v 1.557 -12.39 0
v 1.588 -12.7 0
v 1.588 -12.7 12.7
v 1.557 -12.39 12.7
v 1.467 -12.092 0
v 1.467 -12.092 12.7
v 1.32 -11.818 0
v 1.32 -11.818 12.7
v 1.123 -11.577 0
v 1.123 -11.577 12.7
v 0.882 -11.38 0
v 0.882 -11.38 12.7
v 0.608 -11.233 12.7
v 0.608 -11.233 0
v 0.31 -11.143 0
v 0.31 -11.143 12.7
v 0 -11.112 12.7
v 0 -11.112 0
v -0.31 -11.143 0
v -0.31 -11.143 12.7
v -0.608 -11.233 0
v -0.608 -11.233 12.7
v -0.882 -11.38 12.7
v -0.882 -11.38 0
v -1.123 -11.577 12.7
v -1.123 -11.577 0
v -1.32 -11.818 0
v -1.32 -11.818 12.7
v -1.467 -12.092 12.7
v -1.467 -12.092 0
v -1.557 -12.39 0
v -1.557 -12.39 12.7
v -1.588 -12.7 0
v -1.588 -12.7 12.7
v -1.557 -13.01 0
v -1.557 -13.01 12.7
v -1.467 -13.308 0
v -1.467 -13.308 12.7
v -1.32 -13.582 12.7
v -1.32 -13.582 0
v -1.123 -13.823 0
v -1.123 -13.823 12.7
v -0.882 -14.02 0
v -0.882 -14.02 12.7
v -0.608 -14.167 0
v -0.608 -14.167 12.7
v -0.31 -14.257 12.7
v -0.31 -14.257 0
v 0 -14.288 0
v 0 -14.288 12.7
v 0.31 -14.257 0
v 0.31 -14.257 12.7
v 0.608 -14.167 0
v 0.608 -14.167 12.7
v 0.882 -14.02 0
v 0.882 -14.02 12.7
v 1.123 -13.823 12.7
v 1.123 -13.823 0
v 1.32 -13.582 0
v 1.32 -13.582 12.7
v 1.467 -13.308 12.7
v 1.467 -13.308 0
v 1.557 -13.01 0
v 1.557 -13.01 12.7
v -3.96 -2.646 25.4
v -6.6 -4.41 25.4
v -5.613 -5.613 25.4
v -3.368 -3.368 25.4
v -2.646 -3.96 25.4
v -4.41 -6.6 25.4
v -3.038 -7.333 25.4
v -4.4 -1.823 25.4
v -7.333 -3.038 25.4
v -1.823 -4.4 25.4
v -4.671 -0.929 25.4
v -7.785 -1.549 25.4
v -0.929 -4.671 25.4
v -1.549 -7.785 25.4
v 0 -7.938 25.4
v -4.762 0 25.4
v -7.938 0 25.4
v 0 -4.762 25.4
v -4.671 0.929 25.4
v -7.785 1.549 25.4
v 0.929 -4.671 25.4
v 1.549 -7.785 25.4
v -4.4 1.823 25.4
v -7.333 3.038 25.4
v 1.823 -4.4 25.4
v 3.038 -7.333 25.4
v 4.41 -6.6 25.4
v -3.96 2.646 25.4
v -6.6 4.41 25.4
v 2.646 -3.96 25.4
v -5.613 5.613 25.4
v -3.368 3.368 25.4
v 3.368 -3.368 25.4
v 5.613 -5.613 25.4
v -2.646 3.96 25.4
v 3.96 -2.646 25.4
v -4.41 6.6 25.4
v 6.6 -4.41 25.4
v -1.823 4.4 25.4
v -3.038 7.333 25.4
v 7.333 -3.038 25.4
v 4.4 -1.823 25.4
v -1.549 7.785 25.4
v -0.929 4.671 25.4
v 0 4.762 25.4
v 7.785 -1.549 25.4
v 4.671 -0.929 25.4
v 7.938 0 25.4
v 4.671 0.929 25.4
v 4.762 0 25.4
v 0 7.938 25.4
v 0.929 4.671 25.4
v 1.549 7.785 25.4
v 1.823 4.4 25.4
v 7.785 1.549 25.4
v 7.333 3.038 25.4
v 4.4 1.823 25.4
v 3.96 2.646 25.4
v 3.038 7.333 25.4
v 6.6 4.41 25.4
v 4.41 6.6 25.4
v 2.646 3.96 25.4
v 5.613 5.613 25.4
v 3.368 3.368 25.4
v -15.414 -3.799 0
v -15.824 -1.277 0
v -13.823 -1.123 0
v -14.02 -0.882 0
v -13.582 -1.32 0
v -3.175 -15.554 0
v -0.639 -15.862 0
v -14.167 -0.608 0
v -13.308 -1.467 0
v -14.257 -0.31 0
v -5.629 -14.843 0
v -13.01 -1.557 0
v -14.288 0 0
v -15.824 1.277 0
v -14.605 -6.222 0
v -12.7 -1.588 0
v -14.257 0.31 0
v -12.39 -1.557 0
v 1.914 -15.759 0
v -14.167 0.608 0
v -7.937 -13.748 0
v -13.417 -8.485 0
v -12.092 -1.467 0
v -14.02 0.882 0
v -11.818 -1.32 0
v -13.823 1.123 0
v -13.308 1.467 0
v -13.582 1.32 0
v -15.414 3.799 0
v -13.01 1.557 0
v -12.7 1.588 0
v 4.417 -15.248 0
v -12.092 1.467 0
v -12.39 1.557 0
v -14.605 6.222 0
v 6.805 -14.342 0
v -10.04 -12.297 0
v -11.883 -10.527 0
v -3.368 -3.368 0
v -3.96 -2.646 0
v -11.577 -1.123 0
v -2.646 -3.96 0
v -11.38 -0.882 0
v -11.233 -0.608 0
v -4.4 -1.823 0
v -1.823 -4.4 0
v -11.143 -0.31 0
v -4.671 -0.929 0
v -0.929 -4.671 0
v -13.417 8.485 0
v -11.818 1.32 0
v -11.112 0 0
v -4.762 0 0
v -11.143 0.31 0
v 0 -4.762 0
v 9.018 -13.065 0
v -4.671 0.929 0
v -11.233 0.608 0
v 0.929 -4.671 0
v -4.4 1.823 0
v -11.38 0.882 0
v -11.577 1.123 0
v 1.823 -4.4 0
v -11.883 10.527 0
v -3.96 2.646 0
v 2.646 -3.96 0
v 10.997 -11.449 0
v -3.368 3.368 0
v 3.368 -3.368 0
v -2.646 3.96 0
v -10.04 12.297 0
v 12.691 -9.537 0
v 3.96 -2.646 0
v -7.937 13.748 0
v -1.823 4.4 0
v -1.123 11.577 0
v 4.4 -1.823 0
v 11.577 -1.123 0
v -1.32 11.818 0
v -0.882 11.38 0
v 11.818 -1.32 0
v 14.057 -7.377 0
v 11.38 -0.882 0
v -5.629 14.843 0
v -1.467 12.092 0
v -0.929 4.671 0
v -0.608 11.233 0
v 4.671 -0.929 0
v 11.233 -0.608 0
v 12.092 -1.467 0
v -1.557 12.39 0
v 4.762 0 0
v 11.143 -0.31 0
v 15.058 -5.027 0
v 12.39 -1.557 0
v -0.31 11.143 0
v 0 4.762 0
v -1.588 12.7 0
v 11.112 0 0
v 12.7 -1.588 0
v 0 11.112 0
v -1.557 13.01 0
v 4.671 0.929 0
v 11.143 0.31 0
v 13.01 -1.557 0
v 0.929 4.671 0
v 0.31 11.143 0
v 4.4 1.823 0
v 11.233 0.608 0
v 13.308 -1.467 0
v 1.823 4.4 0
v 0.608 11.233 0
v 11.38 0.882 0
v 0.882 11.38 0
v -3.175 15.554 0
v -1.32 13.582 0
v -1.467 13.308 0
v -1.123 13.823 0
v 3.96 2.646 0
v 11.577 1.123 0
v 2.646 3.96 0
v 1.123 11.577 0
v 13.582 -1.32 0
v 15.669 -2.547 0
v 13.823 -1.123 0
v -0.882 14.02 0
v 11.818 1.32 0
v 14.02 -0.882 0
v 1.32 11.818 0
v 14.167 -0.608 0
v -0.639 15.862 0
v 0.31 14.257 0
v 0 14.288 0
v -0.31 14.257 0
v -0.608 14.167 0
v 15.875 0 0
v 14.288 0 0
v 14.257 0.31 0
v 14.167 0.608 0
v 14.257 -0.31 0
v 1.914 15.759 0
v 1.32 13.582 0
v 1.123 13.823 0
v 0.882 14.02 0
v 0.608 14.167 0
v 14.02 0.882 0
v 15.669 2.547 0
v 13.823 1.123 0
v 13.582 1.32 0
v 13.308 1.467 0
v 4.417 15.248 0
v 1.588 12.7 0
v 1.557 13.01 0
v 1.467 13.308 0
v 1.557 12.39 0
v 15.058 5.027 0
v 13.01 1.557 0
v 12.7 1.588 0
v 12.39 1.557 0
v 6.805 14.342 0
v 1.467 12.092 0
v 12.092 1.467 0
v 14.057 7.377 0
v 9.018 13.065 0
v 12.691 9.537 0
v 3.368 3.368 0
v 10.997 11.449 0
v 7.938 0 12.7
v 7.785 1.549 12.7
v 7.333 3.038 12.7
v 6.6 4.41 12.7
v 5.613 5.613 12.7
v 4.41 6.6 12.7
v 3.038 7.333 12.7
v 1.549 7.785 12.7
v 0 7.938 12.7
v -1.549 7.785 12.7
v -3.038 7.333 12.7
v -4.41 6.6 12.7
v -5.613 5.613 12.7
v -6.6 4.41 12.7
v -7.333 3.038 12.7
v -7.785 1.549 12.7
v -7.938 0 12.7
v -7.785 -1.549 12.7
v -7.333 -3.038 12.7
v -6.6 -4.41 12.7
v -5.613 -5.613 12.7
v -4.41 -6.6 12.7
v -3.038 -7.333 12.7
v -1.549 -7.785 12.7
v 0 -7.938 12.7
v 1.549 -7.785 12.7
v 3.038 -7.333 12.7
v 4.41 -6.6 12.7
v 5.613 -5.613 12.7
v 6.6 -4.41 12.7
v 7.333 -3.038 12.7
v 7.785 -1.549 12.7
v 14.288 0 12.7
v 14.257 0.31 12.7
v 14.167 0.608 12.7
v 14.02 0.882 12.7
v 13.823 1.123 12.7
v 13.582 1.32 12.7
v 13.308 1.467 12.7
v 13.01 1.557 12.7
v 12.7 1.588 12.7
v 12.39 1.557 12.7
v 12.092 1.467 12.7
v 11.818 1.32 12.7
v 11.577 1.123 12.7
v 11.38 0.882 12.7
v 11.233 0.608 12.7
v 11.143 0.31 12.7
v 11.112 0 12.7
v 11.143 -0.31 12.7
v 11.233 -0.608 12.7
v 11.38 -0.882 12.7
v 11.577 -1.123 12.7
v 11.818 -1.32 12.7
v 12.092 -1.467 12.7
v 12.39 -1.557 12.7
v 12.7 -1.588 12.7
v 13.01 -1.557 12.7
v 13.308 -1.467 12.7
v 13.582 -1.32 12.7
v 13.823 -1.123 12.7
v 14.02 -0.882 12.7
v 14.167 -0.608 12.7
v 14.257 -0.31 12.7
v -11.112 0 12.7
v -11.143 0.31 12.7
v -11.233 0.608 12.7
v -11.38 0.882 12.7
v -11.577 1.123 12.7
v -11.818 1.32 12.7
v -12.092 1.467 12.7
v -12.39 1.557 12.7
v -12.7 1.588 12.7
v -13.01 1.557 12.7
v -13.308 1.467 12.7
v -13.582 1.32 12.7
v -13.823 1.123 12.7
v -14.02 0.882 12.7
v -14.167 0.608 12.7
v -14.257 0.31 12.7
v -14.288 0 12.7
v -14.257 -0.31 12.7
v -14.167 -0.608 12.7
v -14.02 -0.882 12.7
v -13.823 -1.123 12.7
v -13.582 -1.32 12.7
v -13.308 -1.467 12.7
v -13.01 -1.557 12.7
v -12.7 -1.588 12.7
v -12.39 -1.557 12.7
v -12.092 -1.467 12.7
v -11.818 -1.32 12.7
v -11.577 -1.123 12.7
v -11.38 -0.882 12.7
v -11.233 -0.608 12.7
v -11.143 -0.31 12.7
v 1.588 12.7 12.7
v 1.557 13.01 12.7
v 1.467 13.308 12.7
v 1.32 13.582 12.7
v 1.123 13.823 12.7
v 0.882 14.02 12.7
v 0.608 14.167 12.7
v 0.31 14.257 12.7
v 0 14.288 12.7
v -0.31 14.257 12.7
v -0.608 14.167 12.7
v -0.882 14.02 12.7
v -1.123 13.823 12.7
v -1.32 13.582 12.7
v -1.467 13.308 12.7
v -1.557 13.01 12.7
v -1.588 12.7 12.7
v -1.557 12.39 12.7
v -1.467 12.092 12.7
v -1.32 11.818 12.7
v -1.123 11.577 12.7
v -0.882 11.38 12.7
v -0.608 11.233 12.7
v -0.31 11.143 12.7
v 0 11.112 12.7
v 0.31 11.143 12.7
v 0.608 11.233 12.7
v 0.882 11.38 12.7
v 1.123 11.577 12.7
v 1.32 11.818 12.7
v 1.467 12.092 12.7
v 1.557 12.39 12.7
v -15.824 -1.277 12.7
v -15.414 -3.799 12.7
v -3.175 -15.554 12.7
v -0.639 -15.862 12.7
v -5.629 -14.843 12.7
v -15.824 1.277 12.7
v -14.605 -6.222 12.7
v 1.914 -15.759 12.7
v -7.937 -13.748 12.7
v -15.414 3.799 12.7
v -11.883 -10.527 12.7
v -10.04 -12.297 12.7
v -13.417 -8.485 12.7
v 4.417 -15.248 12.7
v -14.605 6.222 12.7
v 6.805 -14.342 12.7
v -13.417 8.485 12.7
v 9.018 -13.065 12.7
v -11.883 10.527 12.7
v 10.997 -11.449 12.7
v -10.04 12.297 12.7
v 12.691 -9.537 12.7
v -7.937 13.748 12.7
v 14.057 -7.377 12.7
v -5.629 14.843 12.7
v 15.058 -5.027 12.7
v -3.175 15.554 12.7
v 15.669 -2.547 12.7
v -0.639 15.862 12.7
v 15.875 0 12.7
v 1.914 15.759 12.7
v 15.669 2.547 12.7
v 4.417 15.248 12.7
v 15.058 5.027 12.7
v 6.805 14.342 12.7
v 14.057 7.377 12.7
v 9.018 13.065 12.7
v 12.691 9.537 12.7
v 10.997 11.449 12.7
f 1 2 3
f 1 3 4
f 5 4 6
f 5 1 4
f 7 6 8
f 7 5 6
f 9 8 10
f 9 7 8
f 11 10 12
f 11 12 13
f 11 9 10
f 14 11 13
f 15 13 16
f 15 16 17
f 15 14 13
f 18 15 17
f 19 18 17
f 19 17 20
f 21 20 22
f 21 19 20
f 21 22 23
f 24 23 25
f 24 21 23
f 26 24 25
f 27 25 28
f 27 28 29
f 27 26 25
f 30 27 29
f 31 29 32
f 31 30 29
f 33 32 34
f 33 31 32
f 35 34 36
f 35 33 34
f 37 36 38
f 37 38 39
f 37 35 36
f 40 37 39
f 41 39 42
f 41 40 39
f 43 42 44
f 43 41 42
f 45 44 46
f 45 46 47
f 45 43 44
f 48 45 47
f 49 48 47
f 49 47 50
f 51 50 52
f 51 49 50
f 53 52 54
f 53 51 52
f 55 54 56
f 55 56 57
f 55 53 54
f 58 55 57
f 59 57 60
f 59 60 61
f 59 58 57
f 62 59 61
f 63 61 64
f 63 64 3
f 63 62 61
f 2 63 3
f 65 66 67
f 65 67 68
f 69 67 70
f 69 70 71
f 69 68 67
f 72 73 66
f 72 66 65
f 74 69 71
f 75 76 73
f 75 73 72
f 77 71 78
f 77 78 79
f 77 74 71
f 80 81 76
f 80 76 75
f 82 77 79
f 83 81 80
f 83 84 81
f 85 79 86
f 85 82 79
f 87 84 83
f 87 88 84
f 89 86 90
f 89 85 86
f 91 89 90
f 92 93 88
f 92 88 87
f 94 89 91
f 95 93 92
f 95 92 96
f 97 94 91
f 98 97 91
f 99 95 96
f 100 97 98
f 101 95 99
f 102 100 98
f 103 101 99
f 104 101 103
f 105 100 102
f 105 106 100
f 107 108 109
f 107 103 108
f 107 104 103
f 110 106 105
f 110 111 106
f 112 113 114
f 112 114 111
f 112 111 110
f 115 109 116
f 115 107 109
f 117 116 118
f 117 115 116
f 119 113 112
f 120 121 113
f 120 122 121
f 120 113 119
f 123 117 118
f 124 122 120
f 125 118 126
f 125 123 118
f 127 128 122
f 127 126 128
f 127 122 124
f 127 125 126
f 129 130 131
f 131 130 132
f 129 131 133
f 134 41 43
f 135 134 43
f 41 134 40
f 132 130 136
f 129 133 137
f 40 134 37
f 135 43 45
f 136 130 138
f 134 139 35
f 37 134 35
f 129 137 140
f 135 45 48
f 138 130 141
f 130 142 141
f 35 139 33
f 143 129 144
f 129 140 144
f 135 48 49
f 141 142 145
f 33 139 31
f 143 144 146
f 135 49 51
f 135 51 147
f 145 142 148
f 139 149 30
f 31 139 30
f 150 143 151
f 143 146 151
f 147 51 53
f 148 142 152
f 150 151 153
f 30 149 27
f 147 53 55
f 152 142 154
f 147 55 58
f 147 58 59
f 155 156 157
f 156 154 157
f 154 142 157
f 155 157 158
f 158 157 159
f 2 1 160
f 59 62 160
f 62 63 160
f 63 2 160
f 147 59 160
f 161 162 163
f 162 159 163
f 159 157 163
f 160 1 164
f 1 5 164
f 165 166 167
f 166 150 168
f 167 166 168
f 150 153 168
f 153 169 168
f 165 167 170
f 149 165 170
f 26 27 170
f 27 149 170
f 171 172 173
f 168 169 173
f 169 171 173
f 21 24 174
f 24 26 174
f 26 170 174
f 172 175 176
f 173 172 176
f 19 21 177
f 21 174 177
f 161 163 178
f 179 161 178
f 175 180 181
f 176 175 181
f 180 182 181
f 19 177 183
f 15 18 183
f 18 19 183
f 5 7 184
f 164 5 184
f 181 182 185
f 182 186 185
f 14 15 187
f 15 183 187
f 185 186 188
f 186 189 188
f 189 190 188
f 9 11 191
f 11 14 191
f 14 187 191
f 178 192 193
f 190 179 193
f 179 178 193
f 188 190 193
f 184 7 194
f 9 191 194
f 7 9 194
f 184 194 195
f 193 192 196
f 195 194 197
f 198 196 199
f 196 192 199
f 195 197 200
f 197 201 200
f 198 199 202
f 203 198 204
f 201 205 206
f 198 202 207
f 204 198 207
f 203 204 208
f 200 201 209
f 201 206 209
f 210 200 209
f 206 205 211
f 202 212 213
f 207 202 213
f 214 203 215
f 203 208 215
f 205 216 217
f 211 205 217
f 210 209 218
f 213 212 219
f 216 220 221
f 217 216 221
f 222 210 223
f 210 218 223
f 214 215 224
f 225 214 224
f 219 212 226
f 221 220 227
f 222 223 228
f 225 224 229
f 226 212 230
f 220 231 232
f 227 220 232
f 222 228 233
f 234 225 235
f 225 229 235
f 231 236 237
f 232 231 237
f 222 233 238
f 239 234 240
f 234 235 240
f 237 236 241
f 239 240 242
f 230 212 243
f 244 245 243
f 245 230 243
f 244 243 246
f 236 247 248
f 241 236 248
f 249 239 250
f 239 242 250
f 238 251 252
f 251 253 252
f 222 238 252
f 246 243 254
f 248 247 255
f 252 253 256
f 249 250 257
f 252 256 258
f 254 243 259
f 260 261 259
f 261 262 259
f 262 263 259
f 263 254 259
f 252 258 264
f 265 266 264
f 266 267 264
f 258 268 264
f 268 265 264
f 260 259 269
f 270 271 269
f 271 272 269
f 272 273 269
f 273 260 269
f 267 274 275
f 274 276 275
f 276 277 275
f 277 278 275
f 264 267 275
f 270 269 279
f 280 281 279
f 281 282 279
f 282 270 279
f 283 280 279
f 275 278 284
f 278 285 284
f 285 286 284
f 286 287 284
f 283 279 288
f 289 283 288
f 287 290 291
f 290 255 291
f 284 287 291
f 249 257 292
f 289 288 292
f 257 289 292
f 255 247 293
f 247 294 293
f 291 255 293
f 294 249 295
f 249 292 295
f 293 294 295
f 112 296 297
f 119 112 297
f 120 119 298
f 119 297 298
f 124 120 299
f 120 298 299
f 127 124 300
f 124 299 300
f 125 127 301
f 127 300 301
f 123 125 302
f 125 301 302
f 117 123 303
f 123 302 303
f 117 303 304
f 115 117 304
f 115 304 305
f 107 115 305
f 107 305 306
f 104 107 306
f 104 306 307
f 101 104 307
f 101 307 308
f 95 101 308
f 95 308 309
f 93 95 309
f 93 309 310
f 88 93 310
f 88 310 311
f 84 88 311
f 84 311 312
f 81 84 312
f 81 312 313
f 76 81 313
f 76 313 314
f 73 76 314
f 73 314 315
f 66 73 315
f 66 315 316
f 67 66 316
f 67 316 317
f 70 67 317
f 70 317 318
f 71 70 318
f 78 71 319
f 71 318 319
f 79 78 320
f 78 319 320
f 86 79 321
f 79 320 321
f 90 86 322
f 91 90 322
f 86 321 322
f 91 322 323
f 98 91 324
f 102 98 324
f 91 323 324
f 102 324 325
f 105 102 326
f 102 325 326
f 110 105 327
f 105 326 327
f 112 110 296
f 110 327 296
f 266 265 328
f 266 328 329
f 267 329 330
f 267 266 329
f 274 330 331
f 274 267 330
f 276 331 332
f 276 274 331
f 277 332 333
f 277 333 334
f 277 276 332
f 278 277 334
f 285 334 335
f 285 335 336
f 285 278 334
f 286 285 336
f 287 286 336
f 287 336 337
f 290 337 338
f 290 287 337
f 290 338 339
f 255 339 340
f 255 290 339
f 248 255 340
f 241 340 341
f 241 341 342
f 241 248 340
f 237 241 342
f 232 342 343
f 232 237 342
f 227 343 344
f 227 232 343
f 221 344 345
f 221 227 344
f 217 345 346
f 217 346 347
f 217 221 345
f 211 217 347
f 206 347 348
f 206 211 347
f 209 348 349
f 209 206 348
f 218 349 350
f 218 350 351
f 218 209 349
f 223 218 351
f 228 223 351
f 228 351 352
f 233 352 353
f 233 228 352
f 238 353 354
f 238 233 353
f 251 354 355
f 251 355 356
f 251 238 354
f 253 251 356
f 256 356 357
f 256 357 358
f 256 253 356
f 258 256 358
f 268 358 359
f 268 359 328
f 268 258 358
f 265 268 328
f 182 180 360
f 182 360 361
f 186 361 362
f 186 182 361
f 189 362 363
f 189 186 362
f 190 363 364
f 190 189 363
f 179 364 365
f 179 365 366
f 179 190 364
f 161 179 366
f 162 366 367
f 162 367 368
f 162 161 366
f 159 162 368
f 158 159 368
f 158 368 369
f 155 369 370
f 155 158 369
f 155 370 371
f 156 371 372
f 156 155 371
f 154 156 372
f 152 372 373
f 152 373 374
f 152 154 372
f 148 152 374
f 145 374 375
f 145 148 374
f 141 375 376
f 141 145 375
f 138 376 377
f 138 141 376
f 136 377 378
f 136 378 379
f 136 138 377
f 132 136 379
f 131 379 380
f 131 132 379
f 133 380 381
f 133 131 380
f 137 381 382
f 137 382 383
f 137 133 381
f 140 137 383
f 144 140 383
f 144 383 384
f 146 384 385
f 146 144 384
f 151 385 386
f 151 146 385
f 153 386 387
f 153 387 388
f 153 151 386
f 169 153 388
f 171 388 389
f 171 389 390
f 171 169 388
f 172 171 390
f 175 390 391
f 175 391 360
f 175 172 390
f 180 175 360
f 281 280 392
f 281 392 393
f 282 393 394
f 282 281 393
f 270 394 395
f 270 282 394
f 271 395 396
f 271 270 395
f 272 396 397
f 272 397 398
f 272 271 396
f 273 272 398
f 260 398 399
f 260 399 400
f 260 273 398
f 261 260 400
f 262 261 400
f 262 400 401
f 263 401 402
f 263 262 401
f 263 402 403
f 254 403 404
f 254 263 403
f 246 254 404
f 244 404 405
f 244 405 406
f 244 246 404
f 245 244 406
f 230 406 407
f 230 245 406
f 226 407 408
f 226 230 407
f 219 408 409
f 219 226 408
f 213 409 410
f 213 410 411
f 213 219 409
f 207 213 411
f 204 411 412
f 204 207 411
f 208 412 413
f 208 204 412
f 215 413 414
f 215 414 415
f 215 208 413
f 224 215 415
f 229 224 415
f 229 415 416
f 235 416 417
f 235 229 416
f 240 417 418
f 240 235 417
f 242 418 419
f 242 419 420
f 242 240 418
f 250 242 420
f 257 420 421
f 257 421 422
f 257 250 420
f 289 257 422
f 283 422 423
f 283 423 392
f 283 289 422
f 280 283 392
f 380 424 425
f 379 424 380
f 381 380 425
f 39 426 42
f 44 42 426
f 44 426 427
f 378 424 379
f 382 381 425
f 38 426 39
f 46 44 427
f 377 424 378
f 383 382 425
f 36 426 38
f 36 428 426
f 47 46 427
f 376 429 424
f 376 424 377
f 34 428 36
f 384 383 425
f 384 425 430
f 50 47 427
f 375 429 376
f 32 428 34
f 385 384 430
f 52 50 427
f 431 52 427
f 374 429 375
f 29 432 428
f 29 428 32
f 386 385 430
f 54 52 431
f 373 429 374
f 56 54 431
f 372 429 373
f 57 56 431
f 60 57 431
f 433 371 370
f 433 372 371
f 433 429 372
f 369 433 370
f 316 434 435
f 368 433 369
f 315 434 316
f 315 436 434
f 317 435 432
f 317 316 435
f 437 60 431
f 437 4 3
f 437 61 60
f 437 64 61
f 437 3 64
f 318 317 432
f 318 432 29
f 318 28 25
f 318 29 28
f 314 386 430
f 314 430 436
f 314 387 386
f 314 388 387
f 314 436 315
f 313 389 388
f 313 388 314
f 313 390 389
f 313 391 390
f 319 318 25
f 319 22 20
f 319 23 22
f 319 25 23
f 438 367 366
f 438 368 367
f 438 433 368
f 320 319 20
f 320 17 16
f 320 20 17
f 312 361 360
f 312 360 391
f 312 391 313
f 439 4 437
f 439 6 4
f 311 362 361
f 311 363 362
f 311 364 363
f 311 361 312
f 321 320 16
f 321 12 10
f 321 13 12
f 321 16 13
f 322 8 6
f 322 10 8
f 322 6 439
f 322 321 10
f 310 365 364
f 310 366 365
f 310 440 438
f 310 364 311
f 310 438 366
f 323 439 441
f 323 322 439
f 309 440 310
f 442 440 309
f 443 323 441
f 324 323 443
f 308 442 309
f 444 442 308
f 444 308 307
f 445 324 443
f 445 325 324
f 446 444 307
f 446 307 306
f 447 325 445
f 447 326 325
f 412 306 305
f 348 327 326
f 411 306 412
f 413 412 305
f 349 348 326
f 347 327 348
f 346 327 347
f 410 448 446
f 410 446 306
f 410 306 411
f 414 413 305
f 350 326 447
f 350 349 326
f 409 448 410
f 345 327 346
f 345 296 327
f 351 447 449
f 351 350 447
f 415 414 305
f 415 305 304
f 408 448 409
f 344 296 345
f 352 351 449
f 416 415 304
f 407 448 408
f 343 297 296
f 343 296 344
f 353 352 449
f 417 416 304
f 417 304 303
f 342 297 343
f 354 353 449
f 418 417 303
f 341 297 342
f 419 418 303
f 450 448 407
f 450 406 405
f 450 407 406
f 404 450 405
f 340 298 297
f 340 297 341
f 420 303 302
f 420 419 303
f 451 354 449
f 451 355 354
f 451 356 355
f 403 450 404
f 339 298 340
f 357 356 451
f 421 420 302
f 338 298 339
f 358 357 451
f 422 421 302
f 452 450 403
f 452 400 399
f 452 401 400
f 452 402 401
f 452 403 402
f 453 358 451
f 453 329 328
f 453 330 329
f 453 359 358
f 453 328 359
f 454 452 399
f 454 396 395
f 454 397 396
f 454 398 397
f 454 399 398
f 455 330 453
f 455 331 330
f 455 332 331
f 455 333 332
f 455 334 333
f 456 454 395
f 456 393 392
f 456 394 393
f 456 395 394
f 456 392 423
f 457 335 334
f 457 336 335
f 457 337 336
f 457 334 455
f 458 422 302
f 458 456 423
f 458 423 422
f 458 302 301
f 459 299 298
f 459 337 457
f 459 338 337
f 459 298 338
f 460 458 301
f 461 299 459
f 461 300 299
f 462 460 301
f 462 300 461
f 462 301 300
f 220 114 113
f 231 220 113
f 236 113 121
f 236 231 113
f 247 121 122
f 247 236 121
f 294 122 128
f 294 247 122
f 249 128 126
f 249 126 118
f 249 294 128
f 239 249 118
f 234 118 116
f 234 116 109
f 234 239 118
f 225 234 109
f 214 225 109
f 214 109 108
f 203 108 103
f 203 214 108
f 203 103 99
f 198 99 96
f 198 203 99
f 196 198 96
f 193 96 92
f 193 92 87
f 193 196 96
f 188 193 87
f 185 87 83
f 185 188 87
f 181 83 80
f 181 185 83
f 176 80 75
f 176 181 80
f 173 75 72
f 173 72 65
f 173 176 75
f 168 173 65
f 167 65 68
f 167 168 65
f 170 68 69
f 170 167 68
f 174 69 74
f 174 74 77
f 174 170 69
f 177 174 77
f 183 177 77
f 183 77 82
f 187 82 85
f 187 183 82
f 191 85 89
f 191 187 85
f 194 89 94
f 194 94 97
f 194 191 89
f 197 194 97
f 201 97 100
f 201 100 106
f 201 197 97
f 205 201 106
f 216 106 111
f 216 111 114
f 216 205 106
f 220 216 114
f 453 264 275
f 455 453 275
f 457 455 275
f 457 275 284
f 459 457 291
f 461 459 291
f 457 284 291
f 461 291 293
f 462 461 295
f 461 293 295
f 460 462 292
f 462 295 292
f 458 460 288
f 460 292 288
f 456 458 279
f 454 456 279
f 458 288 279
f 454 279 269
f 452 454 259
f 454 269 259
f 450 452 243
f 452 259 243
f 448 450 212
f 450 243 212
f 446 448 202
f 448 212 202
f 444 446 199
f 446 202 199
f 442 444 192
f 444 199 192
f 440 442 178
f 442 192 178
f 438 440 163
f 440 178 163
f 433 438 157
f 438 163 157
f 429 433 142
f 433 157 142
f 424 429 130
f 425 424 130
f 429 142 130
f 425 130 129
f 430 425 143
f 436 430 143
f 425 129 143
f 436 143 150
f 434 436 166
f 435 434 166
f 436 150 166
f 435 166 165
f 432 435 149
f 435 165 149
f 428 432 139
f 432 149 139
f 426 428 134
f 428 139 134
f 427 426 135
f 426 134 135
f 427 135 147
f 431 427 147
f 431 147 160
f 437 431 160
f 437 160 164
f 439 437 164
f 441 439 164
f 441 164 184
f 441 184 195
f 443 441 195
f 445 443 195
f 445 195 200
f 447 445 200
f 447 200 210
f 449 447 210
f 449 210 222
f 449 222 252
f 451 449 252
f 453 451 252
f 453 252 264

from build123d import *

# Parameters (mm, degrees)
F0_R     = 15.875
F1_DEPTH = 12.7
F2_R     = 7.9375
F3_DEPTH = 25.4
F4_R     = 4.7625
F5_DEPTH = 25.4
F6_R     = 1.5875
F7_DEPTH = 12.7


with BuildPart() as f1:
    # F0 (on Top) → F1 (new body)
    with BuildSketch(Plane.XY):
        Circle(F0_R)
    extrude(amount=F1_DEPTH)

    # F2 (on Top) → F3 (join)
    with BuildSketch(Plane.XY):
        Circle(F2_R)
    extrude(amount=F3_DEPTH)

    # F4 (on Top) → F5 (cut)
    with BuildSketch(Plane.XY):
        Circle(F4_R)
    extrude(amount=F5_DEPTH, mode=Mode.SUBTRACT)

    # F6 (on Top) → F7 (cut)
    with BuildSketch(Plane.XY):
        with Locations((0, 12.7)):
            Circle(F6_R)
        with Locations((12.7, 0)):
            Circle(F6_R)
        with Locations((-12.7, 0)):
            Circle(F6_R)
        with Locations((0, -12.7)):
            Circle(F6_R)
    extrude(amount=F7_DEPTH, mode=Mode.SUBTRACT)


solid = f1.part
